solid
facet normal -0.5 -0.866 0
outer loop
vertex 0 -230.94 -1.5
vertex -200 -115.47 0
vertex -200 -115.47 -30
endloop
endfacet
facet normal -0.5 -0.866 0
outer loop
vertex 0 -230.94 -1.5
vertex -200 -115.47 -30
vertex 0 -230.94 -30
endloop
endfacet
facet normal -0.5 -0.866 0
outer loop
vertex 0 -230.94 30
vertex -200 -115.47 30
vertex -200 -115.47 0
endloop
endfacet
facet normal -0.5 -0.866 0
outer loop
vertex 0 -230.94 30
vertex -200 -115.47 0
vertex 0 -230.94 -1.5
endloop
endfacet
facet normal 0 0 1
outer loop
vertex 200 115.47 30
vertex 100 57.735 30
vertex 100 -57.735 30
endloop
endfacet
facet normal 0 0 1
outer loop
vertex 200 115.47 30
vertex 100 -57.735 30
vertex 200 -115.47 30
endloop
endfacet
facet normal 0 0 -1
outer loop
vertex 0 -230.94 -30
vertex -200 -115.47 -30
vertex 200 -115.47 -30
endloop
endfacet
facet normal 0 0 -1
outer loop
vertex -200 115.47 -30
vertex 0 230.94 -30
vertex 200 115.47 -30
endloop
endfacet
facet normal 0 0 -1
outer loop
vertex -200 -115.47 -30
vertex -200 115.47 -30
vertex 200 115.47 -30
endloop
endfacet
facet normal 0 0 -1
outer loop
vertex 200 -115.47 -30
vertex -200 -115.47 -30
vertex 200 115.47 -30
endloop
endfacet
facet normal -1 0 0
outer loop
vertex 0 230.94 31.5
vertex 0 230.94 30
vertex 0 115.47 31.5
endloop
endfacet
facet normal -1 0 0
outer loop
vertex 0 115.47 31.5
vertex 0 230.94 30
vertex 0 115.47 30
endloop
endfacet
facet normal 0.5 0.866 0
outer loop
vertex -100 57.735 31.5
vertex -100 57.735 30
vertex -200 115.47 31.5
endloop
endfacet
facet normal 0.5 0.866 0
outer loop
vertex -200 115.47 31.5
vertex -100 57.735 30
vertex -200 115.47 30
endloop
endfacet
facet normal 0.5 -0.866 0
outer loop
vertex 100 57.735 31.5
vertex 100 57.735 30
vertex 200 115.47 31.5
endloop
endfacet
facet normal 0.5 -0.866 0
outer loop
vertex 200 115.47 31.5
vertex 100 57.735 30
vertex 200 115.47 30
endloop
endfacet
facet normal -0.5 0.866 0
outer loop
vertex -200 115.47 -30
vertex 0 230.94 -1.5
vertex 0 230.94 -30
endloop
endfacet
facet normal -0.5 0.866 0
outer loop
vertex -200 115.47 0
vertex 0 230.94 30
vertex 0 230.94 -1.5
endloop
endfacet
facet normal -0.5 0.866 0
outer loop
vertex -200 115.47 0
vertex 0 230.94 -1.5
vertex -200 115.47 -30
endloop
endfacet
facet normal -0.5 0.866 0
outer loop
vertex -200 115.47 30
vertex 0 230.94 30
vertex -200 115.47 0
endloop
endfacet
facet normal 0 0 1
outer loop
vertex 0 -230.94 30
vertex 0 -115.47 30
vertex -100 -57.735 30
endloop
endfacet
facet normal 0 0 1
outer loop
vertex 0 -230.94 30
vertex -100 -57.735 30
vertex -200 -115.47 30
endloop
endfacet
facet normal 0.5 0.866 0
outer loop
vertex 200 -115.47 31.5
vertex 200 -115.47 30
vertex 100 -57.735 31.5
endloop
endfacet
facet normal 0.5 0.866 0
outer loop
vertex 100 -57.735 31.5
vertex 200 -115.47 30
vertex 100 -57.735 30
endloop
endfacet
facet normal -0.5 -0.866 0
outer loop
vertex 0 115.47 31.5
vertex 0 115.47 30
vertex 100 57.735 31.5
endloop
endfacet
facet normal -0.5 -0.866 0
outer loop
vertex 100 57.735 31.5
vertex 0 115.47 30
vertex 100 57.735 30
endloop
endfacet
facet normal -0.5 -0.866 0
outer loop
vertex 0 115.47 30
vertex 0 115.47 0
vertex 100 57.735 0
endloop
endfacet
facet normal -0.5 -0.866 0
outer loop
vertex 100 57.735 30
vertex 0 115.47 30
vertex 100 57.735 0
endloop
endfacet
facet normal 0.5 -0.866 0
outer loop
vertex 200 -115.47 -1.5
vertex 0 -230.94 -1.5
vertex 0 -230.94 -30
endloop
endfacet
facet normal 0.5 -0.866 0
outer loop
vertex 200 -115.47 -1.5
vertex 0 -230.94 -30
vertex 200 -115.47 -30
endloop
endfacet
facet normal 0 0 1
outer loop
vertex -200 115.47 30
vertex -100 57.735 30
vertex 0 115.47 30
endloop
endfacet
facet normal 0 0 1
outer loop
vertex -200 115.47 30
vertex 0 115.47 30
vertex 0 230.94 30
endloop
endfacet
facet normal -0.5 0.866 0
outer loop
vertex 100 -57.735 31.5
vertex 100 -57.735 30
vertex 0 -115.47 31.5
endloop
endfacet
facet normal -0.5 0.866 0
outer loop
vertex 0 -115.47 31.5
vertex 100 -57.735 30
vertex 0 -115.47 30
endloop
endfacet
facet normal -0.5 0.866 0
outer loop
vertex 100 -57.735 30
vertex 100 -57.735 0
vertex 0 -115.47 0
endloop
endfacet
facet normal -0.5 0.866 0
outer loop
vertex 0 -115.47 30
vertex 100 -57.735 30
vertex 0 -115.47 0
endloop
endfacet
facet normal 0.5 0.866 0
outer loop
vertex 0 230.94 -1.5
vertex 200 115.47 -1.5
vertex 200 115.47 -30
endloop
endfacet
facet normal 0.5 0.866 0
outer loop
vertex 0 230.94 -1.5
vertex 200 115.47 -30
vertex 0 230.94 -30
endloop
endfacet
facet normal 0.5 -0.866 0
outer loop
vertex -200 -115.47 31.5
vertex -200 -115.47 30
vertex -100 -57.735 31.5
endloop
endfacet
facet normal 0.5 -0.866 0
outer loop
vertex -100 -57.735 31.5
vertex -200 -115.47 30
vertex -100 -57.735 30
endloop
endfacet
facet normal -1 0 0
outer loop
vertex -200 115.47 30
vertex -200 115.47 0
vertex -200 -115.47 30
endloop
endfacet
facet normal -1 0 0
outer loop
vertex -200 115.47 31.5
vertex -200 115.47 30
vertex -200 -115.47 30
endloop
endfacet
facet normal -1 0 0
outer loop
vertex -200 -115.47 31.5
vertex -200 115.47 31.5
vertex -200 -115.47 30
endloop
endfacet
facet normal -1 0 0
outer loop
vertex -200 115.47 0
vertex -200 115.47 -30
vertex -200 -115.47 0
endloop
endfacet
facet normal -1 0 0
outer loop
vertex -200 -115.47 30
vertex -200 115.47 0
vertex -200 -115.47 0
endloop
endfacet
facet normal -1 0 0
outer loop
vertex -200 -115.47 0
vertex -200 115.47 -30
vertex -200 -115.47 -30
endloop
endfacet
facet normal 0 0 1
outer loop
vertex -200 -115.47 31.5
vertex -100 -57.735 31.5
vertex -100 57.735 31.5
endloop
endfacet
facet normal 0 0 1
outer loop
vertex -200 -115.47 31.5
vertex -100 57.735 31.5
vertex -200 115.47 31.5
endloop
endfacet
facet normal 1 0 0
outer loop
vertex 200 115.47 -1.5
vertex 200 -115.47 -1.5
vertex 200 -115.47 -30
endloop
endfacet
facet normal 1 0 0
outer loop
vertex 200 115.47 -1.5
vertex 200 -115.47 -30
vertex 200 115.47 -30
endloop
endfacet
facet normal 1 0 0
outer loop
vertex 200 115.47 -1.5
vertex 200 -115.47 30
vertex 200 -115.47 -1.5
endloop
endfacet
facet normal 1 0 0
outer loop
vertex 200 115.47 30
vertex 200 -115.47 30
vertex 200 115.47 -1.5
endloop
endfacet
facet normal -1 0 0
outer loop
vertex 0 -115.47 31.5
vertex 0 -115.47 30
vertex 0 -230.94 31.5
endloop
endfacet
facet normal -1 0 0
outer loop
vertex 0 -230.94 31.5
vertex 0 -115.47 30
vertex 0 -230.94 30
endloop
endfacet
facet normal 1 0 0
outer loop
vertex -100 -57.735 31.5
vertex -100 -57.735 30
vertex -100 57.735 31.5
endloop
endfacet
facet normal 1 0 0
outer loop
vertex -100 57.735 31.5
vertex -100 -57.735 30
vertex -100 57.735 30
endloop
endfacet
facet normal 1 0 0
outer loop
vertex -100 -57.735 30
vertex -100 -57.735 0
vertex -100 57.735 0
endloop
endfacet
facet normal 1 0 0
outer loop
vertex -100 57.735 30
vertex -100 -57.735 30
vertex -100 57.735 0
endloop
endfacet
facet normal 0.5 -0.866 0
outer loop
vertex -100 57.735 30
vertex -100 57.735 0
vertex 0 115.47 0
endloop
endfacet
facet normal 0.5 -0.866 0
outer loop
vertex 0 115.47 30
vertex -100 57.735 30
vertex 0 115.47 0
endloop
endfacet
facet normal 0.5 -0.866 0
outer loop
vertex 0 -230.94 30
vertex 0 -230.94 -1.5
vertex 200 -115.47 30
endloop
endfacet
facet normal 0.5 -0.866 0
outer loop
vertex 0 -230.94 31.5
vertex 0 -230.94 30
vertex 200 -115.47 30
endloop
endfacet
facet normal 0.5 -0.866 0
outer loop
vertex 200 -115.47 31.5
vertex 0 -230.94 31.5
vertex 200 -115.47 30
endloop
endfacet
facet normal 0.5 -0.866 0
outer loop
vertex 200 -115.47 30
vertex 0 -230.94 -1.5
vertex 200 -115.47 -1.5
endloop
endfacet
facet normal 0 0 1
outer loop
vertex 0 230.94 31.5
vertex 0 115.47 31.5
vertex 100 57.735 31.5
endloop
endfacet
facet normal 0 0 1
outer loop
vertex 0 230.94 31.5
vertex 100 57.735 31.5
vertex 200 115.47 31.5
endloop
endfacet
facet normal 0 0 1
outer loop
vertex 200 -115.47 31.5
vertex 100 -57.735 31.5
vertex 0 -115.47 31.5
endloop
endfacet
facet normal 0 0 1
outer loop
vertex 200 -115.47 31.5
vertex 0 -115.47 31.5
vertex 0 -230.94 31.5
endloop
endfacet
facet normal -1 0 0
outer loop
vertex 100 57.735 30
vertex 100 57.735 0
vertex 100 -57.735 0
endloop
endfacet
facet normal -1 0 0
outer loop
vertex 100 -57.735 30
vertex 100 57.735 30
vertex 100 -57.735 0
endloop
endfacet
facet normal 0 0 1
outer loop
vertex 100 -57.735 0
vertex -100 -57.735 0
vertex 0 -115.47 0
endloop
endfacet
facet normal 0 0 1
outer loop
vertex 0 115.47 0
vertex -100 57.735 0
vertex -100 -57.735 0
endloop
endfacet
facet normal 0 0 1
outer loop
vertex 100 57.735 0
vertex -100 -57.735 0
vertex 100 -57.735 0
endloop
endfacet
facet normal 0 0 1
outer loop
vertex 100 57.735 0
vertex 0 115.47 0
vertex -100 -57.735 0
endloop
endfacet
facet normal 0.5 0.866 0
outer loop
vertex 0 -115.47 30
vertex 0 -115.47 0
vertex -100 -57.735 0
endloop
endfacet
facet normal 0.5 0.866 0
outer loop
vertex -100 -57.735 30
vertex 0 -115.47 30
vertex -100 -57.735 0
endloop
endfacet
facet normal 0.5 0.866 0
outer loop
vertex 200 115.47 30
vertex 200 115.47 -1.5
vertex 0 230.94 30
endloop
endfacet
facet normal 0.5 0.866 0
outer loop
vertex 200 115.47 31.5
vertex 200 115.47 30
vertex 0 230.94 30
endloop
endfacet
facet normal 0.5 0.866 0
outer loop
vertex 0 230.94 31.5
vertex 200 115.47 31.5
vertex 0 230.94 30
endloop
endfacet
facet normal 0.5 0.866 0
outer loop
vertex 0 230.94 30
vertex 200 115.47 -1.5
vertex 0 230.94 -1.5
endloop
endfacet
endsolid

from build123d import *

# Parameters (mm, degrees)
BOSS_EXTRUDE1_DEPTH   = 30
BODY_MOVE_COPY1_ANGLE = 60
SCALE1_SCALE_X        = 1
SCALE1_SCALE_Y        = 1
SCALE1_SCALE_Z        = 1.1
CIRPATTERN2_COUNT     = 3
BOSS_EXTRUDE3_DEPTH   = 30


with BuildPart() as part:
    # Sketch1 → Boss-Extrude1 (new body)
    with BuildSketch(Plane.XY):
        Polygon((200, -115.470053838), (200, 115.470053838), (100, 57.735026919), (100, -57.735026919), align=None)
    extrude(amount=BOSS_EXTRUDE1_DEPTH)


with BuildPart() as body_2:
    # Body-Move/Copy1: copy of part
    add(part.part.rotate(Axis((0, 0, 0), (0, 0, 1)), BODY_MOVE_COPY1_ANGLE))


with BuildPart() as body_2_1:
    # Scale1: scaled about (77.777777778, 134.715062811, 15)
    add(body_2.part.scale((SCALE1_SCALE_X, SCALE1_SCALE_Y, SCALE1_SCALE_Z), about=(77.777777778, 134.715062811, 15)))

    # Combine1: union part
    add(part.part)


with BuildPart() as cirpattern2_1:
    # CirPattern2: pattern copy
    add(body_2_1.part.rotate(Axis((0, 0, -1.5), (0, 0, 1)), 1 * 360 / CIRPATTERN2_COUNT))


with BuildPart() as cirpattern2_2:
    # CirPattern2: pattern copy
    add(body_2_1.part.rotate(Axis((0, 0, -1.5), (0, 0, 1)), 2 * 360 / CIRPATTERN2_COUNT))


with BuildPart() as body_2_2:
    add(body_2_1.part)

    add(cirpattern2_1.part)  # Boss-Extrude3 merges CirPattern2_1

    add(cirpattern2_2.part)  # Boss-Extrude3 merges CirPattern2_2
    # Sketch2 → Boss-Extrude3 (add)
    with BuildSketch(Plane(origin=(0, 0, 0), x_dir=(-1, 0, 0), z_dir=(0, 0, -1))):
        Polygon((-200, 115.470053838), (0, 230.940107676), (200, 115.470053838), (200, -115.470053838), (0, -230.940107676), (-200, -115.470053838), align=None)
    extrude(amount=BOSS_EXTRUDE3_DEPTH)


solid = body_2_2.part
